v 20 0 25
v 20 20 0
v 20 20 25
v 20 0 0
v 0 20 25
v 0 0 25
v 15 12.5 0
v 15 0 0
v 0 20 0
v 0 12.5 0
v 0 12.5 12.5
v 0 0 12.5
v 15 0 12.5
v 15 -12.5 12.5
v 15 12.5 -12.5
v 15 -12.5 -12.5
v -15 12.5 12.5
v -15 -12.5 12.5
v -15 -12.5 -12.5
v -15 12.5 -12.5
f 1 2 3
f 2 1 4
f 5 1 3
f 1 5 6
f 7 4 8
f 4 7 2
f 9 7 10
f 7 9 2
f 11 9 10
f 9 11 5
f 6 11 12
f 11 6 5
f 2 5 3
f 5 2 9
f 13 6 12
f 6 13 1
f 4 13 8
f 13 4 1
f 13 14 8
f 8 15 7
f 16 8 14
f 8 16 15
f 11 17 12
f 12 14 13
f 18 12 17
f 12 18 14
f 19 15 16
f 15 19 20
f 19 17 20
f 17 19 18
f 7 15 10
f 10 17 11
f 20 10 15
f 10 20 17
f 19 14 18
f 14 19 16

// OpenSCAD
// Generated by generate_scads.py
union() {
  cube(size=[20,20,25], center=false);
  cube(size=[30,25,25], center=true);
}
